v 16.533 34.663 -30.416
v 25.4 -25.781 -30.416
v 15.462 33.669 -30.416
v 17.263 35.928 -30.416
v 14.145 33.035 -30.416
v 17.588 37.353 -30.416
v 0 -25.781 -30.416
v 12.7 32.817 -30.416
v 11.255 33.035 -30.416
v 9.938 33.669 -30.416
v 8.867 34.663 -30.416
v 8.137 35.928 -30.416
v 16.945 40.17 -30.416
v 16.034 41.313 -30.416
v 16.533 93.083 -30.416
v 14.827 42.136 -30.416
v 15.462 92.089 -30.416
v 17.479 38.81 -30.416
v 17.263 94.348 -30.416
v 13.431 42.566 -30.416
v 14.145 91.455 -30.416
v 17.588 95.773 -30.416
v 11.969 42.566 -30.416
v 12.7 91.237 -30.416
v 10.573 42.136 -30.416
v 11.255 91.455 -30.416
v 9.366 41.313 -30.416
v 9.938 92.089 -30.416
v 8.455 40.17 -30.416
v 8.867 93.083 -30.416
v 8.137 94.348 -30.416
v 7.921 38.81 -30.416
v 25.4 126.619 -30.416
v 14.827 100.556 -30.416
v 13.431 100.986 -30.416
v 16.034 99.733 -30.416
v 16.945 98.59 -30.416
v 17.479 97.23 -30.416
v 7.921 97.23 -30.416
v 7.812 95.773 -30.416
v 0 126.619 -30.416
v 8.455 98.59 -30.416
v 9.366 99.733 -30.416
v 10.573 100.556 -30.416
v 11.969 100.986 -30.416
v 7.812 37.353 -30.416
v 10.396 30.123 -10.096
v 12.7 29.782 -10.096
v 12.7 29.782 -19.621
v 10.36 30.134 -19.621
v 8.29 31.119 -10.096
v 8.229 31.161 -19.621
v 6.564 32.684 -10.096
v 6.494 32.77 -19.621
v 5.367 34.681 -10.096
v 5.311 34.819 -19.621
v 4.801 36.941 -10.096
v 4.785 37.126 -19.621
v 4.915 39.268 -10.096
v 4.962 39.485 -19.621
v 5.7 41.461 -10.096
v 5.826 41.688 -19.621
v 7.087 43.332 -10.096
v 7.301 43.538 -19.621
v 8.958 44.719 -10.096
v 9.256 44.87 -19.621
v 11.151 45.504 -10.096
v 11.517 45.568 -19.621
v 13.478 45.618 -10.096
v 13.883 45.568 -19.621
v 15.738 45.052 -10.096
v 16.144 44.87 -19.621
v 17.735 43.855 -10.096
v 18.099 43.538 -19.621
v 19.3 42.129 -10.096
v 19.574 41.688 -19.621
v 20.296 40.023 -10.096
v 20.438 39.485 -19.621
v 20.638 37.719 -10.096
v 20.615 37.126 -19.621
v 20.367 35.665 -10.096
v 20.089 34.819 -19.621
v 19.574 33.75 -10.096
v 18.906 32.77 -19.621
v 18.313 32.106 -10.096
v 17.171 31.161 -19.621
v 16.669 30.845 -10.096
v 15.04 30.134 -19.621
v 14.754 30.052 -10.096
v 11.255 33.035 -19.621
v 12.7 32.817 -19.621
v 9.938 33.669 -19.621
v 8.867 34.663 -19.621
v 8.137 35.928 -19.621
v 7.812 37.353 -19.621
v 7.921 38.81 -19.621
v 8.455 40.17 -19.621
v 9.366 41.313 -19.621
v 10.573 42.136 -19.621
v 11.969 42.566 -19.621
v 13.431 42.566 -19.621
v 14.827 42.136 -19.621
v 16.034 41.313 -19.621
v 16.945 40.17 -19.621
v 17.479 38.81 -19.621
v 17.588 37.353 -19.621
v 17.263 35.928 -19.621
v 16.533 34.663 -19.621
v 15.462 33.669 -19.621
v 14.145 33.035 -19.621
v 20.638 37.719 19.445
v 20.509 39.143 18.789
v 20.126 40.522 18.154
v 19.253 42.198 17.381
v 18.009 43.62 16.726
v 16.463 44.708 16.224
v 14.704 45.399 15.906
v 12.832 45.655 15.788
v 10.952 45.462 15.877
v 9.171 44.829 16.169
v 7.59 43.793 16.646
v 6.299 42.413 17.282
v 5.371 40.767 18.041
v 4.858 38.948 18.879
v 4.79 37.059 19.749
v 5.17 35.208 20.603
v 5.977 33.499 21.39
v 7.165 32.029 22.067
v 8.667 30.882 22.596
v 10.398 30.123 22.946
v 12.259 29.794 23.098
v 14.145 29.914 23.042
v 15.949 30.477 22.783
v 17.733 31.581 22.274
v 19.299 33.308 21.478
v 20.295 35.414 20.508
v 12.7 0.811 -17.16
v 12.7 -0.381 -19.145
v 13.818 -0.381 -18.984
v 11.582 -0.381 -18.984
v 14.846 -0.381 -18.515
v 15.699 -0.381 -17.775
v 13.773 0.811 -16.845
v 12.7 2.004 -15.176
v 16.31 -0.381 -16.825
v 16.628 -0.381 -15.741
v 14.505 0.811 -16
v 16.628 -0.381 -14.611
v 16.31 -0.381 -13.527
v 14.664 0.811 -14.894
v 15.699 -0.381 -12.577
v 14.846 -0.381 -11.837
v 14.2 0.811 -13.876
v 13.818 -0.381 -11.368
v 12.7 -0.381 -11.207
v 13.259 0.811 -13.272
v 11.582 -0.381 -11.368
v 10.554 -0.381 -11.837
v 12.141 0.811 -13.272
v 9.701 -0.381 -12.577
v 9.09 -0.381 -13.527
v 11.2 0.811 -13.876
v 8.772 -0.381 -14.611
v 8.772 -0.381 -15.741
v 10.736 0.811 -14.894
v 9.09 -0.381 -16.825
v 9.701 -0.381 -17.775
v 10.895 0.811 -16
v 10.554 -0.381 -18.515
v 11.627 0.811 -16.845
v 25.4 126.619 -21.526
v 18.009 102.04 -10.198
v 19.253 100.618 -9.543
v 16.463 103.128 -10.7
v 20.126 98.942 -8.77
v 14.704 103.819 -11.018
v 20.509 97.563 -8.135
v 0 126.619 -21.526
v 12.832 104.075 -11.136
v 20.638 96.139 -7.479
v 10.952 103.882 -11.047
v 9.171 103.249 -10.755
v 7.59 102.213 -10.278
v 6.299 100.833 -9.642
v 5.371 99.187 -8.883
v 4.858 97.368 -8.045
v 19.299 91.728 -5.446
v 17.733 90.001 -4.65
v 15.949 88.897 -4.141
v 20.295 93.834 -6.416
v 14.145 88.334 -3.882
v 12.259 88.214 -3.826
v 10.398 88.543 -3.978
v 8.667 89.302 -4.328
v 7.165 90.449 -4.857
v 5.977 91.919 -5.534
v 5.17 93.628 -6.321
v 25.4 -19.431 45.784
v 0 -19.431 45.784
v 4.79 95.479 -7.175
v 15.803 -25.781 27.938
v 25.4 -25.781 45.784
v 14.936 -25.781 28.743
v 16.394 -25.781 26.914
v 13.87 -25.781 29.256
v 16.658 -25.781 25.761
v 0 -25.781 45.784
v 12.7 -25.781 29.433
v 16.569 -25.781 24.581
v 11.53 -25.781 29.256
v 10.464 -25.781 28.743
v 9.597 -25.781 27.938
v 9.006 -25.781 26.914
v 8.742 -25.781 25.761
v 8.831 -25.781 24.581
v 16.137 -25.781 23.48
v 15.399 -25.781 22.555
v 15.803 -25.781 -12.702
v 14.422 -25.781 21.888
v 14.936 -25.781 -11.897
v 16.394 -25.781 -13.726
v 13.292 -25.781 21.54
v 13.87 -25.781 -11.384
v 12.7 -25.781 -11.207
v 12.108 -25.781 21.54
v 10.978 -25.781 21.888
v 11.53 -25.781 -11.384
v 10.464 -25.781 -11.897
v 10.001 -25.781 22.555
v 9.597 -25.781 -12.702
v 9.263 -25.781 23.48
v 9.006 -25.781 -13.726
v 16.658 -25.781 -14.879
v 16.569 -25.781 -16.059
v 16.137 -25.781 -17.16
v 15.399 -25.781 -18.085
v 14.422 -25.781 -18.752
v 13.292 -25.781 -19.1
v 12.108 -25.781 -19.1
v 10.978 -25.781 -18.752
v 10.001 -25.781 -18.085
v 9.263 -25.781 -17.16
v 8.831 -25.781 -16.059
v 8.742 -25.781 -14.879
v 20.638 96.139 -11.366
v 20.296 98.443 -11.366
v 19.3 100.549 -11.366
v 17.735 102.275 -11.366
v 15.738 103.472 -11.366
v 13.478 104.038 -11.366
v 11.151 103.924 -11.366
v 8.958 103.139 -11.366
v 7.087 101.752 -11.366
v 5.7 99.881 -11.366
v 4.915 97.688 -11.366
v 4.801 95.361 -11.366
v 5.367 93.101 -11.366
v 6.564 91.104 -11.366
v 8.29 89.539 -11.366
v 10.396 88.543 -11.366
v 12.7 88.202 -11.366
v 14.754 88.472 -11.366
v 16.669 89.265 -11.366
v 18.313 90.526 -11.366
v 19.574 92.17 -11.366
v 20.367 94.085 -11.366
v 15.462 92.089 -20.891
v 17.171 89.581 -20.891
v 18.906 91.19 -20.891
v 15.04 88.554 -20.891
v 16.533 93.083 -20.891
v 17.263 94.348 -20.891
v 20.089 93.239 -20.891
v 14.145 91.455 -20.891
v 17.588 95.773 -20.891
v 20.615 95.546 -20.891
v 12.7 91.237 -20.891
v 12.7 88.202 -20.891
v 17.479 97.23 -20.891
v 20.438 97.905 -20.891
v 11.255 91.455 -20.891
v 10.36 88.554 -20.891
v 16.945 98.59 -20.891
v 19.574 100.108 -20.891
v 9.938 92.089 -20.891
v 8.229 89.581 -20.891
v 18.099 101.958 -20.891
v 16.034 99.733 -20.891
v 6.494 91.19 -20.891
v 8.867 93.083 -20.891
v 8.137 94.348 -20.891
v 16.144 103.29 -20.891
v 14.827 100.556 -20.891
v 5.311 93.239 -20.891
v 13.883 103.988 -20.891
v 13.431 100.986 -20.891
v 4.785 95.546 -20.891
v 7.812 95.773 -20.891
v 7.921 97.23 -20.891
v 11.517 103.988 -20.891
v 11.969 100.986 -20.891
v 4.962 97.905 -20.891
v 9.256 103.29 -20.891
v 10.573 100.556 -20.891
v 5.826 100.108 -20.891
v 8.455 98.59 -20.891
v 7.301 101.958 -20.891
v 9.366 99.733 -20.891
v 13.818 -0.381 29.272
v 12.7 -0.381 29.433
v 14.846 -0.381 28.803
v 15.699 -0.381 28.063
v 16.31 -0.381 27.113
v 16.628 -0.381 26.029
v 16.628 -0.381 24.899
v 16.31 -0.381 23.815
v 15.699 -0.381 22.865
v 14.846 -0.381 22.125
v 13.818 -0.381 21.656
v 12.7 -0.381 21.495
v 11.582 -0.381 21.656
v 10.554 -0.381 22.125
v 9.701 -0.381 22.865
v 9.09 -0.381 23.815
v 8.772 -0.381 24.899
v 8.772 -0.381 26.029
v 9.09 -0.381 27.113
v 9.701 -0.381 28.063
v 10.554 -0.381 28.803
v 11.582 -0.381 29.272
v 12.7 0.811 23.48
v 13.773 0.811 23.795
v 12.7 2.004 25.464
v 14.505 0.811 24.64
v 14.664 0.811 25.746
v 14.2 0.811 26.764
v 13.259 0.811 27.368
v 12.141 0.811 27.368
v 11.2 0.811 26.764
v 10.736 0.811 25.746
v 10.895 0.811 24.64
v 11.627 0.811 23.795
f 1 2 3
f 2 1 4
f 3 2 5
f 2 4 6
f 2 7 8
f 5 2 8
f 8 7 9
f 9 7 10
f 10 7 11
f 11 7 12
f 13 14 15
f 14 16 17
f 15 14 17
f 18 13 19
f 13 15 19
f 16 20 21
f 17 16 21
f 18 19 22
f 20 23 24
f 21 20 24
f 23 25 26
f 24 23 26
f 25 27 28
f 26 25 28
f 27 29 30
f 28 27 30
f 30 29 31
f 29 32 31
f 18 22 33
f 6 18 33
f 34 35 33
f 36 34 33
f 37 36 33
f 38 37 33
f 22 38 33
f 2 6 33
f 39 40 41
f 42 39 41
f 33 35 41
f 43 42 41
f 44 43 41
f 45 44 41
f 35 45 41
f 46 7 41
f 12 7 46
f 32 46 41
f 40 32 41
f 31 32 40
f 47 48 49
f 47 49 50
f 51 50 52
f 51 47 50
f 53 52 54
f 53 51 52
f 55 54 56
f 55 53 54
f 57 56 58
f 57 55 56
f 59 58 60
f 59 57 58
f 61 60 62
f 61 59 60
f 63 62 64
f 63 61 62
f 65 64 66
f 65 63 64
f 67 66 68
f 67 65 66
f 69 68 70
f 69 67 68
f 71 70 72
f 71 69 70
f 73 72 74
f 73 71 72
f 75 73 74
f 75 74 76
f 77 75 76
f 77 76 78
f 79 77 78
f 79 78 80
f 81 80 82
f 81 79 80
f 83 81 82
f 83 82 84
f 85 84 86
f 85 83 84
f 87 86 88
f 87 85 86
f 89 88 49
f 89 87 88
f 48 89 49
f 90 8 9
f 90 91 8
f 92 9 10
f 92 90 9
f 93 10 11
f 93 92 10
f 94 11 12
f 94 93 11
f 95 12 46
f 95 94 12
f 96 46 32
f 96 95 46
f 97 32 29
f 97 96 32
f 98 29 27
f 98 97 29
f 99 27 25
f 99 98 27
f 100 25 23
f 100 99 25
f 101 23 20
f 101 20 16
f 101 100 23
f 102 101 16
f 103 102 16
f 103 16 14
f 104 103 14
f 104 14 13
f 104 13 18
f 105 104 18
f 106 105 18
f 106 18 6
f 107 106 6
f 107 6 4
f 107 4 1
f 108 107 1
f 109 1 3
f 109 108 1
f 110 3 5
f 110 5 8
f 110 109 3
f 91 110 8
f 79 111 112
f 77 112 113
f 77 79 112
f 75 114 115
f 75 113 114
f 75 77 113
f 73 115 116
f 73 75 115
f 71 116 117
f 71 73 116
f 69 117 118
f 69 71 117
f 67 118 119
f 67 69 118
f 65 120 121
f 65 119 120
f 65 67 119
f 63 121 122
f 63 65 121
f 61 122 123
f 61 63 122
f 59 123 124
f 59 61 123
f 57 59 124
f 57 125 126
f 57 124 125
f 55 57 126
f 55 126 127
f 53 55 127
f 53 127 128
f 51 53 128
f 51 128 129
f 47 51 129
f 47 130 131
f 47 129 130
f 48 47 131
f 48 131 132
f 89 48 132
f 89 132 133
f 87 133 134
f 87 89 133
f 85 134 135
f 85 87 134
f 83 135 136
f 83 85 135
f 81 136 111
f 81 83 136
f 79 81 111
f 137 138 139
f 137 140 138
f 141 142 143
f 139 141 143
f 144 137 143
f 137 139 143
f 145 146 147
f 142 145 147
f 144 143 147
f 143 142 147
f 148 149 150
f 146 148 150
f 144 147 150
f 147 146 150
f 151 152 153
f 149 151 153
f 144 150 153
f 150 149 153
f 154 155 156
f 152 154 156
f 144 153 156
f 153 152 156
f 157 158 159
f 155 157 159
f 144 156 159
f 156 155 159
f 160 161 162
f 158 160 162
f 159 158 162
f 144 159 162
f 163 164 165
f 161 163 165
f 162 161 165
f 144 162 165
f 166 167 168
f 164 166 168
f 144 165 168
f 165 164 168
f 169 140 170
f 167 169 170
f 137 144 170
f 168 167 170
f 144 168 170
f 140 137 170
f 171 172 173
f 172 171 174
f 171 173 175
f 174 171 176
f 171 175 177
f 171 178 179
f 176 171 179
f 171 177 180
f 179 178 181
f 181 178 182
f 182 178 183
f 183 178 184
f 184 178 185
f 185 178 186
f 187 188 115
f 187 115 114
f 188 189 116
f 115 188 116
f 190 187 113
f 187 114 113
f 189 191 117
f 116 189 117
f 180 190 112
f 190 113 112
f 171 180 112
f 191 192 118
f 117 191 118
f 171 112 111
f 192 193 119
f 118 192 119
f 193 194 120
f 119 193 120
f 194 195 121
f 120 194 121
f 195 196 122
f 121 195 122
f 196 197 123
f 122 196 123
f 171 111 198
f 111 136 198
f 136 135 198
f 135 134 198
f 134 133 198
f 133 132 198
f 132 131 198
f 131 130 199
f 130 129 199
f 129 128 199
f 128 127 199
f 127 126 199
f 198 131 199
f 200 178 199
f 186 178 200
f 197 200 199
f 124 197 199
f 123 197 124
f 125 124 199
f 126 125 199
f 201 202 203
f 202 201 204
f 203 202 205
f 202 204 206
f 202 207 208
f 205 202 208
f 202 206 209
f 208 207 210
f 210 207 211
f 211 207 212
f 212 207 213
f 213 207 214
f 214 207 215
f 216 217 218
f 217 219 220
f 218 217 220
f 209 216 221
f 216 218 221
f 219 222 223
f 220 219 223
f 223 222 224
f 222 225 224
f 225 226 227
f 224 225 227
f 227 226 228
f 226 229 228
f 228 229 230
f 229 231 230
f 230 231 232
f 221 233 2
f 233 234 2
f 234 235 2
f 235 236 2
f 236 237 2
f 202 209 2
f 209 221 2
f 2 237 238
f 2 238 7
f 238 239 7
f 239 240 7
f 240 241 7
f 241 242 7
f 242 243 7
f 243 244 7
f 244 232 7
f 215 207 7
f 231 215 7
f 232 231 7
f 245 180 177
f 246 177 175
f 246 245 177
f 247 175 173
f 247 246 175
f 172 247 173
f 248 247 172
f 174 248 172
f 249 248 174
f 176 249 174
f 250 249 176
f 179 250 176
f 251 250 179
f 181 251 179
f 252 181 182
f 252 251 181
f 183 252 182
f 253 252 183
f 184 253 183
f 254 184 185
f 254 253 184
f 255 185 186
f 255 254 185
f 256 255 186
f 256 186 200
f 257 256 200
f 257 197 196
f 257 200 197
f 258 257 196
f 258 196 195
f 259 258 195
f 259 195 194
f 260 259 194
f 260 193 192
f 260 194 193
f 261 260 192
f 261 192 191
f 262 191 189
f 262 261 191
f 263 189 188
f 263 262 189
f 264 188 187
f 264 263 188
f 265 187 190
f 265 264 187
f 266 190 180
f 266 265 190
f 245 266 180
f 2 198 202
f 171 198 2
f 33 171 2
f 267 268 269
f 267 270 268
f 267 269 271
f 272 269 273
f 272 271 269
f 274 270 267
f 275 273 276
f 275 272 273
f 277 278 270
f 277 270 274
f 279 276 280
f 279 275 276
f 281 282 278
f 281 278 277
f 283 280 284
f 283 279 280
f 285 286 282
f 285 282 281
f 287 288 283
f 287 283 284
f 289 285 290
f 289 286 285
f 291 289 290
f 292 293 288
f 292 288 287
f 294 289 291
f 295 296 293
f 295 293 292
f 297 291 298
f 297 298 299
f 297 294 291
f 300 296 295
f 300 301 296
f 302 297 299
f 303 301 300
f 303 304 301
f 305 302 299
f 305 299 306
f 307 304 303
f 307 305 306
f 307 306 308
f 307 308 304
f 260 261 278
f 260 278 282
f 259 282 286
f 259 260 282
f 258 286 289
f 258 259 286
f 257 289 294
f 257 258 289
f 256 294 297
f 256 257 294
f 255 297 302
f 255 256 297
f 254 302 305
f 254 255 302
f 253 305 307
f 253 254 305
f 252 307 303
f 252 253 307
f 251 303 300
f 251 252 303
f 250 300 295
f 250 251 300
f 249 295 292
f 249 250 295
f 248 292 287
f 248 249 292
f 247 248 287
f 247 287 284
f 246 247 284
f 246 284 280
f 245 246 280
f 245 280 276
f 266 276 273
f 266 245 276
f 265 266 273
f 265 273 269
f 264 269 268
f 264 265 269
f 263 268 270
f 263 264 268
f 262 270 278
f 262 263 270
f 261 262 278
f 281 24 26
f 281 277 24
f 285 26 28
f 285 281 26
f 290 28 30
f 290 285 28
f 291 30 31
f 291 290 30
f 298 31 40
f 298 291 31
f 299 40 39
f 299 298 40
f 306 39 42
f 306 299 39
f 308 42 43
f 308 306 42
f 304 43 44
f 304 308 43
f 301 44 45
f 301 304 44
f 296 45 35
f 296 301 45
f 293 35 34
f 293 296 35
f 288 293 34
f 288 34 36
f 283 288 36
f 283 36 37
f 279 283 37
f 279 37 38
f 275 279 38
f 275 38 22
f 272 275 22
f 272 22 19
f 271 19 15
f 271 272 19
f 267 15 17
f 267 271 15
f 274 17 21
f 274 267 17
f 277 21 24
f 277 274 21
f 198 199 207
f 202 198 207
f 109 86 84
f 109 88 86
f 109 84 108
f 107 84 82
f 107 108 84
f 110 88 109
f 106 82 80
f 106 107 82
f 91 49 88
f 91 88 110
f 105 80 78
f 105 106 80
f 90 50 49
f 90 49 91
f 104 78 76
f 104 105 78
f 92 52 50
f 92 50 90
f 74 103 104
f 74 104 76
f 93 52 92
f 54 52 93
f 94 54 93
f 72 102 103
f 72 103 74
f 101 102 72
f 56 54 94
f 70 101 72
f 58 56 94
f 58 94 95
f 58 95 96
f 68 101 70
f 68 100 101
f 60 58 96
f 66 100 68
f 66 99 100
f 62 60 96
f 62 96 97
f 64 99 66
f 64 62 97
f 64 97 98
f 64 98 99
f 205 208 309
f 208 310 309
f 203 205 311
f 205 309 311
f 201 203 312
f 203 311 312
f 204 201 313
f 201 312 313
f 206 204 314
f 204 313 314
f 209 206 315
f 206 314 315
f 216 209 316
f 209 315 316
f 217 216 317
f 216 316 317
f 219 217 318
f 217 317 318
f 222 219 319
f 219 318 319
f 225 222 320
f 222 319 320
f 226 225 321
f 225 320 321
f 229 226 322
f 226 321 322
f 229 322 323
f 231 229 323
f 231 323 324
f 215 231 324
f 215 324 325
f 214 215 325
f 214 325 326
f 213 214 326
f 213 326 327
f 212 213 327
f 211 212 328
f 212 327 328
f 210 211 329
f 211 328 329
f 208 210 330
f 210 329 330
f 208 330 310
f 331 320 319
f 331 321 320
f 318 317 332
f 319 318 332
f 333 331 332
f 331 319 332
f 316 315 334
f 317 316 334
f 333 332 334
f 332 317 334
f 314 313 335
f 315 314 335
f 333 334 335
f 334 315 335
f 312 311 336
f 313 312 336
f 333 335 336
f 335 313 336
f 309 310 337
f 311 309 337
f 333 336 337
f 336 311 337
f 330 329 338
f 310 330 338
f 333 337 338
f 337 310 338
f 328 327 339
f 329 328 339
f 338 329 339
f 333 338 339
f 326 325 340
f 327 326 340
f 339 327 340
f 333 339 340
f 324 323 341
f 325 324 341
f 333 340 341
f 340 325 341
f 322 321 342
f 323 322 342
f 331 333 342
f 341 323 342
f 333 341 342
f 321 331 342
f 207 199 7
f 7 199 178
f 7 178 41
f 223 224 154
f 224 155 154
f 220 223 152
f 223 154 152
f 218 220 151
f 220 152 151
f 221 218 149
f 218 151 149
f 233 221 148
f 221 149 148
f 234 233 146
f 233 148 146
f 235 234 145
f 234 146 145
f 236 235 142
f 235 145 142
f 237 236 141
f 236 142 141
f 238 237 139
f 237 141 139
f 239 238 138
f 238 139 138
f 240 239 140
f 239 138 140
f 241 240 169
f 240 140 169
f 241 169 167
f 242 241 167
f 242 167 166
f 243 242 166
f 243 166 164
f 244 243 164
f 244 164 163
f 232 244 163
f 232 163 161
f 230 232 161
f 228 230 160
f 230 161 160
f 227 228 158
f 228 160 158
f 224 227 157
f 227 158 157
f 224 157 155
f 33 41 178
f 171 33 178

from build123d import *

# Parameters (mm, degrees)
BOSS_EXTRUDE2_DEPTH         = 25.4
CUT_EXTRUDE2_REACH          = 59.15
SKETCH7_R                   = 7.9375
F_3_8_16_TAPPED_HOLE1_D     = 7.9375
F_3_8_16_TAPPED_HOLE1_DEPTH = 25.4
F_3_8_16_TAPPED_HOLE1_TIP   = 2.384665582


with BuildPart() as part:
    # Sketch1 → Boss-Extrude2 (new body)
    with BuildSketch(Plane(origin=(0, 0, 0), x_dir=(0, 0, -1), z_dir=(1, 0, 0))):
        Polygon((21.525976172, 126.619), (-45.784023828, -19.431), (-45.784023828, -25.781), (30.415976172, -25.781), (30.415976172, 126.619), align=None)
    extrude(amount=BOSS_EXTRUDE2_DEPTH)

    # Sketch4 → CBORE for 3/8 Socket Head Cap Screw1 (revolve, cut)
    with BuildSketch(Plane(origin=(12.7, 96.139, -11.365976172), x_dir=(0, -1, 0), z_dir=(1, 0, 0))):
        Polygon((0, 0), (0, 19.05), (4.9022, 19.05), (4.9022, 9.525), (7.9375, 9.525), (7.9375, 0), align=None)
    revolve(axis=Axis((12.7, 96.139, -5.015976172), (0, 0, -1)), mode=Mode.SUBTRACT)

    # Sketch6 → CBORE for 3/8 Socket Head Cap Screw2 (revolve, cut)
    with BuildSketch(Plane(origin=(12.7, 37.719, -10.095976172), x_dir=(0, -1, 0), z_dir=(1, 0, 0))):
        Polygon((0, 0), (0, 20.32), (4.9022, 20.32), (4.9022, 9.525), (7.9375, 9.525), (7.9375, 0), align=None)
    revolve(axis=Axis((12.7, 37.719, -3.745976172), (0, 0, -1)), mode=Mode.SUBTRACT)

    # Sketch7 → Cut-Extrude2 (cut, up to next)
    with BuildSketch(Plane(origin=(0, 96.139, -11.365976172), x_dir=(1, 0, 0), z_dir=(0, 0, 1)), mode=Mode.PRIVATE) as cut_extrude2_sk1:
        with Locations((12.7, -58.42)):
            Circle(SKETCH7_R)
    cut_extrude2_tool1 = extrude(cut_extrude2_sk1.sketch, amount=CUT_EXTRUDE2_REACH, mode=Mode.PRIVATE) & part.part
    add(cut_extrude2_tool1.solids().sort_by_distance((12.7, 37.719, -11.365976))[0], mode=Mode.SUBTRACT)
    # Sketch7 → Cut-Extrude2 (cut, up to next)
    with BuildSketch(Plane(origin=(0, 96.139, -11.365976172), x_dir=(1, 0, 0), z_dir=(0, 0, 1)), mode=Mode.PRIVATE) as cut_extrude2_sk2:
        with Locations((12.7, 0)):
            Circle(SKETCH7_R)
    cut_extrude2_tool2 = extrude(cut_extrude2_sk2.sketch, amount=CUT_EXTRUDE2_REACH, mode=Mode.PRIVATE) & part.part
    add(cut_extrude2_tool2.solids().sort_by_distance((12.7, 96.139, -11.365976))[0], mode=Mode.SUBTRACT)

    # 3/8-16 Tapped Hole1
    with Locations(Plane(origin=(12.7, -25.781, -15.175976172), x_dir=(0, 0, -1), z_dir=(0, -1, 0))):
        with Locations((0, 0), (-40.64, 0)):
            Hole(F_3_8_16_TAPPED_HOLE1_D / 2, depth=F_3_8_16_TAPPED_HOLE1_DEPTH)
            with Locations((0, 0, -(F_3_8_16_TAPPED_HOLE1_DEPTH + F_3_8_16_TAPPED_HOLE1_TIP / 2))):  # 118° drill point
                Cone(0, F_3_8_16_TAPPED_HOLE1_D / 2, F_3_8_16_TAPPED_HOLE1_TIP, mode=Mode.SUBTRACT)


solid = part.part
